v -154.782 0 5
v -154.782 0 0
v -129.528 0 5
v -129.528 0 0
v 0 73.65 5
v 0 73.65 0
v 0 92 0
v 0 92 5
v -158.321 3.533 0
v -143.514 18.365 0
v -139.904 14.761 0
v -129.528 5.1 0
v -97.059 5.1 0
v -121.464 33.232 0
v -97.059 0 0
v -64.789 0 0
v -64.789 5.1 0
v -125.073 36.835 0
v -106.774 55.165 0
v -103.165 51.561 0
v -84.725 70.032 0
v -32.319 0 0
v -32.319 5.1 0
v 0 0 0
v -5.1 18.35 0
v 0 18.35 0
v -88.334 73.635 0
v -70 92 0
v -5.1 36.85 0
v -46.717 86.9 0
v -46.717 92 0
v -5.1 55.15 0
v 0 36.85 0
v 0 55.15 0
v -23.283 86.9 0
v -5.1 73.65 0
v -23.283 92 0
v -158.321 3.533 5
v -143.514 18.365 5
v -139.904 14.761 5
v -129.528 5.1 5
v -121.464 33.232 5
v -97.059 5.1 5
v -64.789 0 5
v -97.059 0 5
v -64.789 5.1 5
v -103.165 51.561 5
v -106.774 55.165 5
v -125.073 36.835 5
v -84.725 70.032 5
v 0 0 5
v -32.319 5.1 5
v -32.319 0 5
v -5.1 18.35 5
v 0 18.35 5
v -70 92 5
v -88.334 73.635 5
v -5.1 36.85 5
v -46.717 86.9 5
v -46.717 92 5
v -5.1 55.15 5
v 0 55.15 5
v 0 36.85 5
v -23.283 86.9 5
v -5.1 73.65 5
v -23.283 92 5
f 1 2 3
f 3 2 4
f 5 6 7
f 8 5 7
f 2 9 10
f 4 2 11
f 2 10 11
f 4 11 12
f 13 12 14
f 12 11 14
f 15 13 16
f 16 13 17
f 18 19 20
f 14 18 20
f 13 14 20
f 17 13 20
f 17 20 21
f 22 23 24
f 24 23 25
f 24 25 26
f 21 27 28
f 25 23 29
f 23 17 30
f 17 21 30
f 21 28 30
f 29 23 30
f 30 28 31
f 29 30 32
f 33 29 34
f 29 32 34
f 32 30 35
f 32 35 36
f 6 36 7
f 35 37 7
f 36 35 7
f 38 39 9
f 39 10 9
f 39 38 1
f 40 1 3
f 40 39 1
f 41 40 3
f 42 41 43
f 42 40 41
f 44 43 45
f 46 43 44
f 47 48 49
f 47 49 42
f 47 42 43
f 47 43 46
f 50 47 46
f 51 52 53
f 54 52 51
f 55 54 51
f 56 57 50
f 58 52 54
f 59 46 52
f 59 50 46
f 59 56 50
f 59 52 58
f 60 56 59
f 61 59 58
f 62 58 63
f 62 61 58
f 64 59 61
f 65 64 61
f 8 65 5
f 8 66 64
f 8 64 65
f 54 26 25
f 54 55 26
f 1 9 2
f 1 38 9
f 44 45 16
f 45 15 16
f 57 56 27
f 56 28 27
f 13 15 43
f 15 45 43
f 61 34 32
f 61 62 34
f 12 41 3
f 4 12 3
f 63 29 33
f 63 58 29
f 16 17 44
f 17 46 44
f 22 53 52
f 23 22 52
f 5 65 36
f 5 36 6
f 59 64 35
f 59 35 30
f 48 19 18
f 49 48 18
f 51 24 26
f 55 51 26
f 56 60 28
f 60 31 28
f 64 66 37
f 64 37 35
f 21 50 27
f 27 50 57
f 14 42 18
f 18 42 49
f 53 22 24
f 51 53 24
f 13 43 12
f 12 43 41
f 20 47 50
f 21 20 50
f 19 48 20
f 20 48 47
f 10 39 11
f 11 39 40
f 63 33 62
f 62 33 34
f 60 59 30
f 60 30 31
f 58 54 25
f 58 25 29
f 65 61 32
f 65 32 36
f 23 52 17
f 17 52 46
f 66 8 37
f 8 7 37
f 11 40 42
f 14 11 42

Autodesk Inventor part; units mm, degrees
ref_plane "YZ Plane" through (0, 0, 0) normal (1, 0, 0) x (0, 1, 0)
ref_plane "XZ Plane" through (0, 0, 0) normal (0, 1, 0) x (-1, 0, 0)
ref_plane "XY Plane" through (0, 0, 0) normal (0, 0, 1) x (1, 0, 0)
sketch "Sketch1" plane through (0, 0, 0) normal (0, 0, 1) x (1, 0, 0)
  line L0 (0, 0) -> (0, 92)
  line L1 (0, 92) -> (-70, 92)
  line L2 (-70, 92) -> (-161.8477, 0)
  line L3 (-161.8477, 0) -> (0, 0)
  dimension "d1" = 70
  dimension "d2" = 130
  dimension "d7" = 92
extrude "Extrusion1" add sketch "Sketch1" along normal blind 5
sketch "Sketch2" plane through (0, 0, 5) normal (0, 0, 1) x (1, 0, 0)
  line L0 (-70, 92) -> (-161.8477, 0) projected
  line L1 (-143.5135, 18.3646) -> (-139.9043, 14.7614)
  line L2 (-139.9043, 14.7614) -> (-121.4641, 33.2321)
  line L3 (-121.4641, 33.2321) -> (-125.0733, 36.8354)
  line L4 (-106.7744, 55.1646) -> (-103.1652, 51.5614)
  line L5 (-103.1652, 51.5614) -> (-84.725, 70.0321)
  line L6 (-84.725, 70.0321) -> (-88.3342, 73.6354)
  line L7 (-123.2687, 35.0338) -> (-104.9698, 53.363) construction
  line L8 (-114.1192, 44.1984) -> (-115.9239, 46)
  line L9 (-161.8477, 0) -> (0, 0) projected
  line L10 (-129.5282, 0) -> (-97.0586, 0)
  line L11 (-97.0586, 0) -> (-97.0586, 5.1)
  line L12 (-97.0586, 5.1) -> (-129.5282, 5.1)
  line L13 (-129.5282, 5.1) -> (-129.5282, 0)
  line L14 (-64.7891, 0) -> (-32.3195, 0)
  line L15 (-32.3195, 0) -> (-32.3195, 5.1)
  line L16 (-32.3195, 5.1) -> (-64.7891, 5.1)
  line L17 (-64.7891, 5.1) -> (-64.7891, 0)
  line L18 (0, 18.35) -> (-5.1, 18.35)
  line L19 (-5.1, 18.35) -> (-5.1, 36.85)
  line L20 (-5.1, 36.85) -> (0, 36.85)
  line L21 (0, 36.85) -> (0, 18.35)
  line L22 (0, 55.15) -> (-5.1, 55.15)
  line L23 (-5.1, 55.15) -> (-5.1, 73.65)
  line L24 (-5.1, 73.65) -> (0, 73.65)
  line L25 (0, 73.65) -> (0, 55.15)
  line L26 (0, 92) -> (-70, 92) projected
  line L27 (-46.7167, 92) -> (-23.2833, 92)
  line L28 (-23.2833, 92) -> (-23.2833, 86.9)
  line L29 (-23.2833, 86.9) -> (-46.7167, 86.9)
  line L30 (-46.7167, 86.9) -> (-46.7167, 92)
  line L31 (0, 0) -> (0, 92) projected
  line L32 (-2.55, 36.85) -> (-2.55, 55.15) construction
  line L33 (-64.7891, 2.55) -> (-97.0586, 2.55) construction
  point P0 (-35, 86.9)
  point P1 (-35, 92)
  point P2 (-80.9239, 2.55)
  point P3 (-80.9239, 0)
  point P4 (-2.55, 46)
  point P5 (0, 46)
  point P6 (-35, 92)
  dimension "d8" = 130
  dimension "d9" = 26.1
  dimension "d10" = 25.9
  dimension "d13" = 5.1
  dimension "d14" = 70
  dimension "d15" = 92
  dimension "d16" = 161.8477
  dimension "d17" = 32.2695
  dimension "d18" = 32.4695
  dimension "d19" = 18.3
  dimension "d20" = 18.5
  dimension "d21" = 23.4333
extrude "Extrusion2" cut sketch "Sketch2" against normal blind 10 contours L6 L5 L4 L0 | L26 L28 L29 L30 | L3 L2 L1 L0 | L25 L22 L23 L24 | L21 L18 L19 L20 | L13 L12 L11 L9 | L17 L16 L15 L9
sketch "Sketch3" plane through (0, 0, 5) normal (0, 0, 1) x (1, 0, 0)
  line L0 (-5.1, 36.85) -> (0, 36.85) projected
  line L1 (0, 36.85) -> (0, 55.15) projected
  line L2 (0, 55.15) -> (-5.1, 55.15) projected
  line L3 (-5.1, 55.15) -> (-5.1, 73.65) projected
  line L4 (-5.1, 73.65) -> (0, 73.65) projected
  line L5 (0, 73.65) -> (0, 92) projected
  line L6 (0, 92) -> (-23.2833, 92) projected
  line L7 (-23.2833, 92) -> (-23.2833, 86.9) projected
  line L8 (-23.2833, 86.9) -> (-46.7167, 86.9) projected
  line L9 (-46.7167, 86.9) -> (-46.7167, 92) projected
  line L10 (-46.7167, 92) -> (-70, 92) projected
  line L11 (-70, 92) -> (-88.3342, 73.6354) projected
  line L12 (-88.3342, 73.6354) -> (-84.725, 70.0321) projected
  line L13 (-84.725, 70.0321) -> (-103.1652, 51.5614) projected
  line L14 (-103.1652, 51.5614) -> (-106.7744, 55.1646) projected
  line L15 (-106.7744, 55.1646) -> (-125.0733, 36.8354) projected
  line L16 (-125.0733, 36.8354) -> (-121.4641, 33.2321) projected
  line L17 (-121.4641, 33.2321) -> (-139.9043, 14.7614) projected
  line L18 (-139.9043, 14.7614) -> (-143.5135, 18.3646) projected
  line L19 (-143.5135, 18.3646) -> (-161.8477, 0) projected
  line L20 (-161.8477, 0) -> (-129.5282, 0) projected
  line L21 (-129.5282, 0) -> (-129.5282, 5.1) projected
  line L22 (-129.5282, 5.1) -> (-97.0586, 5.1) projected
  line L23 (-97.0586, 5.1) -> (-97.0586, 0) projected
  line L24 (-97.0586, 0) -> (-64.7891, 0) projected
  line L25 (-64.7891, 0) -> (-64.7891, 5.1) projected
  line L26 (-64.7891, 5.1) -> (-32.3195, 5.1) projected
  line L27 (-32.3195, 5.1) -> (-32.3195, 0) projected
  line L28 (-32.3195, 0) -> (0, 0) projected
  line L29 (0, 0) -> (0, 18.35) projected
  line L30 (0, 18.35) -> (-5.1, 18.35) projected
  line L31 (-5.1, 18.35) -> (-5.1, 36.85) projected
  line L32 (-132.1444, 36.8295) -> (-106.7803, 62.2357)
  line L33 (-106.7803, 62.2357) -> (-103.171, 58.6324)
  line L34 (-103.171, 58.6324) -> (-91.796, 70.0263)
  line L35 (-91.796, 70.0263) -> (-95.4053, 73.6295)
  line L36 (-95.4053, 73.6295) -> (-72.0735, 97)
  line L37 (-72.0735, 97) -> (-41.7167, 97)
  line L38 (-41.7167, 97) -> (-41.7167, 91.9)
  line L39 (-41.7167, 91.9) -> (-28.2833, 91.9)
  line L40 (-28.2833, 91.9) -> (-28.2833, 97)
  line L41 (-28.2833, 97) -> (5, 97)
  line L42 (5, 97) -> (5, 68.65)
  line L43 (5, 68.65) -> (-0.1, 68.65)
  line L44 (-0.1, 68.65) -> (-0.1, 60.15)
  line L45 (-0.1, 60.15) -> (5, 60.15)
  line L46 (5, 60.15) -> (5, 31.85)
  line L47 (5, 31.85) -> (-0.1, 31.85)
  line L48 (-0.1, 31.85) -> (-0.1, 23.35)
  line L49 (-0.1, 23.35) -> (5, 23.35)
  line L50 (5, 23.35) -> (5, -5)
  line L51 (5, -5) -> (-37.3195, -5)
  line L52 (-37.3195, -5) -> (-37.3195, 0.1)
  line L53 (-37.3195, 0.1) -> (-59.7891, 0.1)
  line L54 (-59.7891, 0.1) -> (-59.7891, -5)
  line L55 (-59.7891, -5) -> (-102.0586, -5)
  line L56 (-102.0586, -5) -> (-102.0586, 0.1)
  line L57 (-102.0586, 0.1) -> (-124.5282, 0.1)
  line L58 (-124.5282, 0.1) -> (-124.5282, -5)
  line L59 (-124.5282, -5) -> (-173.9046, -5)
  line L60 (-173.9046, -5) -> (-143.5193, 25.4357)
  line L61 (-143.5193, 25.4357) -> (-139.9101, 21.8324)
  line L62 (-139.9101, 21.8324) -> (-128.5351, 33.2263)
  line L63 (-128.5351, 33.2263) -> (-132.1444, 36.8295)
  line L64 (-143.5135, 18.3646) -> (-147.0519, 21.8972)
  line L65 (-161.8477, 0) -> (-168.9129, 0)
  line L66 (-125.0733, 36.8354) -> (-128.6118, 40.368)
  line L67 (-106.7744, 55.1646) -> (-110.3129, 58.6972)
  line L68 (-103.171, 58.6324) -> (-106.7744, 55.1646)
  line L69 (-91.796, 70.0263) -> (-88.3342, 73.6354)
  line L70 (-88.3342, 73.6354) -> (-91.8727, 77.168)
  line L71 (-70, 92) -> (-77.0652, 92)
  line L72 (-139.9101, 21.8324) -> (-143.5135, 18.3646)
  line L73 (-125.0733, 36.8354) -> (-128.5351, 33.2263)
  line L74 (-143.5135, 18.3646) -> (-161.8477, 0) projected
  line L75 (-161.8477, 0) -> (-165.3862, 3.5326)
  dimension "d22" = 5
extrude "Extrusion3" [suppressed]
sketch "Sketch4" plane through (0, 0, 5) normal (0, 0, 1) x (1, 0, 0)
  line L0 (-5.1, 36.85) -> (0, 36.85) projected
  line L1 (0, 36.85) -> (0, 55.15) projected
  line L2 (0, 55.15) -> (-5.1, 55.15) projected
  line L3 (-5.1, 55.15) -> (-5.1, 73.65) projected
  line L4 (-5.1, 73.65) -> (0, 73.65) projected
  line L5 (0, 73.65) -> (0, 92) projected
  line L6 (0, 92) -> (-23.2833, 92) projected
  line L7 (-23.2833, 92) -> (-23.2833, 86.9) projected
  line L8 (-23.2833, 86.9) -> (-46.7167, 86.9) projected
  line L9 (-46.7167, 86.9) -> (-46.7167, 92) projected
  line L10 (-46.7167, 92) -> (-70, 92) projected
  line L11 (-70, 92) -> (-88.3342, 73.6354) projected
  line L12 (-88.3342, 73.6354) -> (-84.725, 70.0321) projected
  line L13 (-84.725, 70.0321) -> (-103.1652, 51.5614) projected
  line L14 (-103.1652, 51.5614) -> (-106.7744, 55.1646) projected
  line L15 (-106.7744, 55.1646) -> (-125.0733, 36.8354) projected
  line L16 (-125.0733, 36.8354) -> (-121.4641, 33.2321) projected
  line L17 (-121.4641, 33.2321) -> (-139.9043, 14.7614) projected
  line L18 (-139.9043, 14.7614) -> (-143.5135, 18.3646) projected
  line L19 (-143.5135, 18.3646) -> (-161.8477, 0) projected
  line L20 (-161.8477, 0) -> (-129.5282, 0) projected
  line L21 (-129.5282, 0) -> (-129.5282, 5.1) projected
  line L22 (-129.5282, 5.1) -> (-97.0586, 5.1) projected
  line L23 (-97.0586, 5.1) -> (-97.0586, 0) projected
  line L24 (-97.0586, 0) -> (-64.7891, 0) projected
  line L25 (-64.7891, 0) -> (-64.7891, 5.1) projected
  line L26 (-64.7891, 5.1) -> (-32.3195, 5.1) projected
  line L27 (-32.3195, 5.1) -> (-32.3195, 0) projected
  line L28 (-32.3195, 0) -> (0, 0) projected
  line L29 (0, 0) -> (0, 18.35) projected
  line L30 (0, 18.35) -> (-5.1, 18.35) projected
  line L31 (-5.1, 18.35) -> (-5.1, 36.85) projected
  line L32 (-143.5135, 18.3646) -> (-161.8477, 0) projected
  line L33 (-158.3209, 3.5326) -> (-154.7825, 0)
  dimension "d27" = 5
extrude "Extrusion4" cut sketch "Sketch4" against normal through all contours L20 L19 L33
properties part number "SidePlate" material "MDF Medium Density Fiberboard"
